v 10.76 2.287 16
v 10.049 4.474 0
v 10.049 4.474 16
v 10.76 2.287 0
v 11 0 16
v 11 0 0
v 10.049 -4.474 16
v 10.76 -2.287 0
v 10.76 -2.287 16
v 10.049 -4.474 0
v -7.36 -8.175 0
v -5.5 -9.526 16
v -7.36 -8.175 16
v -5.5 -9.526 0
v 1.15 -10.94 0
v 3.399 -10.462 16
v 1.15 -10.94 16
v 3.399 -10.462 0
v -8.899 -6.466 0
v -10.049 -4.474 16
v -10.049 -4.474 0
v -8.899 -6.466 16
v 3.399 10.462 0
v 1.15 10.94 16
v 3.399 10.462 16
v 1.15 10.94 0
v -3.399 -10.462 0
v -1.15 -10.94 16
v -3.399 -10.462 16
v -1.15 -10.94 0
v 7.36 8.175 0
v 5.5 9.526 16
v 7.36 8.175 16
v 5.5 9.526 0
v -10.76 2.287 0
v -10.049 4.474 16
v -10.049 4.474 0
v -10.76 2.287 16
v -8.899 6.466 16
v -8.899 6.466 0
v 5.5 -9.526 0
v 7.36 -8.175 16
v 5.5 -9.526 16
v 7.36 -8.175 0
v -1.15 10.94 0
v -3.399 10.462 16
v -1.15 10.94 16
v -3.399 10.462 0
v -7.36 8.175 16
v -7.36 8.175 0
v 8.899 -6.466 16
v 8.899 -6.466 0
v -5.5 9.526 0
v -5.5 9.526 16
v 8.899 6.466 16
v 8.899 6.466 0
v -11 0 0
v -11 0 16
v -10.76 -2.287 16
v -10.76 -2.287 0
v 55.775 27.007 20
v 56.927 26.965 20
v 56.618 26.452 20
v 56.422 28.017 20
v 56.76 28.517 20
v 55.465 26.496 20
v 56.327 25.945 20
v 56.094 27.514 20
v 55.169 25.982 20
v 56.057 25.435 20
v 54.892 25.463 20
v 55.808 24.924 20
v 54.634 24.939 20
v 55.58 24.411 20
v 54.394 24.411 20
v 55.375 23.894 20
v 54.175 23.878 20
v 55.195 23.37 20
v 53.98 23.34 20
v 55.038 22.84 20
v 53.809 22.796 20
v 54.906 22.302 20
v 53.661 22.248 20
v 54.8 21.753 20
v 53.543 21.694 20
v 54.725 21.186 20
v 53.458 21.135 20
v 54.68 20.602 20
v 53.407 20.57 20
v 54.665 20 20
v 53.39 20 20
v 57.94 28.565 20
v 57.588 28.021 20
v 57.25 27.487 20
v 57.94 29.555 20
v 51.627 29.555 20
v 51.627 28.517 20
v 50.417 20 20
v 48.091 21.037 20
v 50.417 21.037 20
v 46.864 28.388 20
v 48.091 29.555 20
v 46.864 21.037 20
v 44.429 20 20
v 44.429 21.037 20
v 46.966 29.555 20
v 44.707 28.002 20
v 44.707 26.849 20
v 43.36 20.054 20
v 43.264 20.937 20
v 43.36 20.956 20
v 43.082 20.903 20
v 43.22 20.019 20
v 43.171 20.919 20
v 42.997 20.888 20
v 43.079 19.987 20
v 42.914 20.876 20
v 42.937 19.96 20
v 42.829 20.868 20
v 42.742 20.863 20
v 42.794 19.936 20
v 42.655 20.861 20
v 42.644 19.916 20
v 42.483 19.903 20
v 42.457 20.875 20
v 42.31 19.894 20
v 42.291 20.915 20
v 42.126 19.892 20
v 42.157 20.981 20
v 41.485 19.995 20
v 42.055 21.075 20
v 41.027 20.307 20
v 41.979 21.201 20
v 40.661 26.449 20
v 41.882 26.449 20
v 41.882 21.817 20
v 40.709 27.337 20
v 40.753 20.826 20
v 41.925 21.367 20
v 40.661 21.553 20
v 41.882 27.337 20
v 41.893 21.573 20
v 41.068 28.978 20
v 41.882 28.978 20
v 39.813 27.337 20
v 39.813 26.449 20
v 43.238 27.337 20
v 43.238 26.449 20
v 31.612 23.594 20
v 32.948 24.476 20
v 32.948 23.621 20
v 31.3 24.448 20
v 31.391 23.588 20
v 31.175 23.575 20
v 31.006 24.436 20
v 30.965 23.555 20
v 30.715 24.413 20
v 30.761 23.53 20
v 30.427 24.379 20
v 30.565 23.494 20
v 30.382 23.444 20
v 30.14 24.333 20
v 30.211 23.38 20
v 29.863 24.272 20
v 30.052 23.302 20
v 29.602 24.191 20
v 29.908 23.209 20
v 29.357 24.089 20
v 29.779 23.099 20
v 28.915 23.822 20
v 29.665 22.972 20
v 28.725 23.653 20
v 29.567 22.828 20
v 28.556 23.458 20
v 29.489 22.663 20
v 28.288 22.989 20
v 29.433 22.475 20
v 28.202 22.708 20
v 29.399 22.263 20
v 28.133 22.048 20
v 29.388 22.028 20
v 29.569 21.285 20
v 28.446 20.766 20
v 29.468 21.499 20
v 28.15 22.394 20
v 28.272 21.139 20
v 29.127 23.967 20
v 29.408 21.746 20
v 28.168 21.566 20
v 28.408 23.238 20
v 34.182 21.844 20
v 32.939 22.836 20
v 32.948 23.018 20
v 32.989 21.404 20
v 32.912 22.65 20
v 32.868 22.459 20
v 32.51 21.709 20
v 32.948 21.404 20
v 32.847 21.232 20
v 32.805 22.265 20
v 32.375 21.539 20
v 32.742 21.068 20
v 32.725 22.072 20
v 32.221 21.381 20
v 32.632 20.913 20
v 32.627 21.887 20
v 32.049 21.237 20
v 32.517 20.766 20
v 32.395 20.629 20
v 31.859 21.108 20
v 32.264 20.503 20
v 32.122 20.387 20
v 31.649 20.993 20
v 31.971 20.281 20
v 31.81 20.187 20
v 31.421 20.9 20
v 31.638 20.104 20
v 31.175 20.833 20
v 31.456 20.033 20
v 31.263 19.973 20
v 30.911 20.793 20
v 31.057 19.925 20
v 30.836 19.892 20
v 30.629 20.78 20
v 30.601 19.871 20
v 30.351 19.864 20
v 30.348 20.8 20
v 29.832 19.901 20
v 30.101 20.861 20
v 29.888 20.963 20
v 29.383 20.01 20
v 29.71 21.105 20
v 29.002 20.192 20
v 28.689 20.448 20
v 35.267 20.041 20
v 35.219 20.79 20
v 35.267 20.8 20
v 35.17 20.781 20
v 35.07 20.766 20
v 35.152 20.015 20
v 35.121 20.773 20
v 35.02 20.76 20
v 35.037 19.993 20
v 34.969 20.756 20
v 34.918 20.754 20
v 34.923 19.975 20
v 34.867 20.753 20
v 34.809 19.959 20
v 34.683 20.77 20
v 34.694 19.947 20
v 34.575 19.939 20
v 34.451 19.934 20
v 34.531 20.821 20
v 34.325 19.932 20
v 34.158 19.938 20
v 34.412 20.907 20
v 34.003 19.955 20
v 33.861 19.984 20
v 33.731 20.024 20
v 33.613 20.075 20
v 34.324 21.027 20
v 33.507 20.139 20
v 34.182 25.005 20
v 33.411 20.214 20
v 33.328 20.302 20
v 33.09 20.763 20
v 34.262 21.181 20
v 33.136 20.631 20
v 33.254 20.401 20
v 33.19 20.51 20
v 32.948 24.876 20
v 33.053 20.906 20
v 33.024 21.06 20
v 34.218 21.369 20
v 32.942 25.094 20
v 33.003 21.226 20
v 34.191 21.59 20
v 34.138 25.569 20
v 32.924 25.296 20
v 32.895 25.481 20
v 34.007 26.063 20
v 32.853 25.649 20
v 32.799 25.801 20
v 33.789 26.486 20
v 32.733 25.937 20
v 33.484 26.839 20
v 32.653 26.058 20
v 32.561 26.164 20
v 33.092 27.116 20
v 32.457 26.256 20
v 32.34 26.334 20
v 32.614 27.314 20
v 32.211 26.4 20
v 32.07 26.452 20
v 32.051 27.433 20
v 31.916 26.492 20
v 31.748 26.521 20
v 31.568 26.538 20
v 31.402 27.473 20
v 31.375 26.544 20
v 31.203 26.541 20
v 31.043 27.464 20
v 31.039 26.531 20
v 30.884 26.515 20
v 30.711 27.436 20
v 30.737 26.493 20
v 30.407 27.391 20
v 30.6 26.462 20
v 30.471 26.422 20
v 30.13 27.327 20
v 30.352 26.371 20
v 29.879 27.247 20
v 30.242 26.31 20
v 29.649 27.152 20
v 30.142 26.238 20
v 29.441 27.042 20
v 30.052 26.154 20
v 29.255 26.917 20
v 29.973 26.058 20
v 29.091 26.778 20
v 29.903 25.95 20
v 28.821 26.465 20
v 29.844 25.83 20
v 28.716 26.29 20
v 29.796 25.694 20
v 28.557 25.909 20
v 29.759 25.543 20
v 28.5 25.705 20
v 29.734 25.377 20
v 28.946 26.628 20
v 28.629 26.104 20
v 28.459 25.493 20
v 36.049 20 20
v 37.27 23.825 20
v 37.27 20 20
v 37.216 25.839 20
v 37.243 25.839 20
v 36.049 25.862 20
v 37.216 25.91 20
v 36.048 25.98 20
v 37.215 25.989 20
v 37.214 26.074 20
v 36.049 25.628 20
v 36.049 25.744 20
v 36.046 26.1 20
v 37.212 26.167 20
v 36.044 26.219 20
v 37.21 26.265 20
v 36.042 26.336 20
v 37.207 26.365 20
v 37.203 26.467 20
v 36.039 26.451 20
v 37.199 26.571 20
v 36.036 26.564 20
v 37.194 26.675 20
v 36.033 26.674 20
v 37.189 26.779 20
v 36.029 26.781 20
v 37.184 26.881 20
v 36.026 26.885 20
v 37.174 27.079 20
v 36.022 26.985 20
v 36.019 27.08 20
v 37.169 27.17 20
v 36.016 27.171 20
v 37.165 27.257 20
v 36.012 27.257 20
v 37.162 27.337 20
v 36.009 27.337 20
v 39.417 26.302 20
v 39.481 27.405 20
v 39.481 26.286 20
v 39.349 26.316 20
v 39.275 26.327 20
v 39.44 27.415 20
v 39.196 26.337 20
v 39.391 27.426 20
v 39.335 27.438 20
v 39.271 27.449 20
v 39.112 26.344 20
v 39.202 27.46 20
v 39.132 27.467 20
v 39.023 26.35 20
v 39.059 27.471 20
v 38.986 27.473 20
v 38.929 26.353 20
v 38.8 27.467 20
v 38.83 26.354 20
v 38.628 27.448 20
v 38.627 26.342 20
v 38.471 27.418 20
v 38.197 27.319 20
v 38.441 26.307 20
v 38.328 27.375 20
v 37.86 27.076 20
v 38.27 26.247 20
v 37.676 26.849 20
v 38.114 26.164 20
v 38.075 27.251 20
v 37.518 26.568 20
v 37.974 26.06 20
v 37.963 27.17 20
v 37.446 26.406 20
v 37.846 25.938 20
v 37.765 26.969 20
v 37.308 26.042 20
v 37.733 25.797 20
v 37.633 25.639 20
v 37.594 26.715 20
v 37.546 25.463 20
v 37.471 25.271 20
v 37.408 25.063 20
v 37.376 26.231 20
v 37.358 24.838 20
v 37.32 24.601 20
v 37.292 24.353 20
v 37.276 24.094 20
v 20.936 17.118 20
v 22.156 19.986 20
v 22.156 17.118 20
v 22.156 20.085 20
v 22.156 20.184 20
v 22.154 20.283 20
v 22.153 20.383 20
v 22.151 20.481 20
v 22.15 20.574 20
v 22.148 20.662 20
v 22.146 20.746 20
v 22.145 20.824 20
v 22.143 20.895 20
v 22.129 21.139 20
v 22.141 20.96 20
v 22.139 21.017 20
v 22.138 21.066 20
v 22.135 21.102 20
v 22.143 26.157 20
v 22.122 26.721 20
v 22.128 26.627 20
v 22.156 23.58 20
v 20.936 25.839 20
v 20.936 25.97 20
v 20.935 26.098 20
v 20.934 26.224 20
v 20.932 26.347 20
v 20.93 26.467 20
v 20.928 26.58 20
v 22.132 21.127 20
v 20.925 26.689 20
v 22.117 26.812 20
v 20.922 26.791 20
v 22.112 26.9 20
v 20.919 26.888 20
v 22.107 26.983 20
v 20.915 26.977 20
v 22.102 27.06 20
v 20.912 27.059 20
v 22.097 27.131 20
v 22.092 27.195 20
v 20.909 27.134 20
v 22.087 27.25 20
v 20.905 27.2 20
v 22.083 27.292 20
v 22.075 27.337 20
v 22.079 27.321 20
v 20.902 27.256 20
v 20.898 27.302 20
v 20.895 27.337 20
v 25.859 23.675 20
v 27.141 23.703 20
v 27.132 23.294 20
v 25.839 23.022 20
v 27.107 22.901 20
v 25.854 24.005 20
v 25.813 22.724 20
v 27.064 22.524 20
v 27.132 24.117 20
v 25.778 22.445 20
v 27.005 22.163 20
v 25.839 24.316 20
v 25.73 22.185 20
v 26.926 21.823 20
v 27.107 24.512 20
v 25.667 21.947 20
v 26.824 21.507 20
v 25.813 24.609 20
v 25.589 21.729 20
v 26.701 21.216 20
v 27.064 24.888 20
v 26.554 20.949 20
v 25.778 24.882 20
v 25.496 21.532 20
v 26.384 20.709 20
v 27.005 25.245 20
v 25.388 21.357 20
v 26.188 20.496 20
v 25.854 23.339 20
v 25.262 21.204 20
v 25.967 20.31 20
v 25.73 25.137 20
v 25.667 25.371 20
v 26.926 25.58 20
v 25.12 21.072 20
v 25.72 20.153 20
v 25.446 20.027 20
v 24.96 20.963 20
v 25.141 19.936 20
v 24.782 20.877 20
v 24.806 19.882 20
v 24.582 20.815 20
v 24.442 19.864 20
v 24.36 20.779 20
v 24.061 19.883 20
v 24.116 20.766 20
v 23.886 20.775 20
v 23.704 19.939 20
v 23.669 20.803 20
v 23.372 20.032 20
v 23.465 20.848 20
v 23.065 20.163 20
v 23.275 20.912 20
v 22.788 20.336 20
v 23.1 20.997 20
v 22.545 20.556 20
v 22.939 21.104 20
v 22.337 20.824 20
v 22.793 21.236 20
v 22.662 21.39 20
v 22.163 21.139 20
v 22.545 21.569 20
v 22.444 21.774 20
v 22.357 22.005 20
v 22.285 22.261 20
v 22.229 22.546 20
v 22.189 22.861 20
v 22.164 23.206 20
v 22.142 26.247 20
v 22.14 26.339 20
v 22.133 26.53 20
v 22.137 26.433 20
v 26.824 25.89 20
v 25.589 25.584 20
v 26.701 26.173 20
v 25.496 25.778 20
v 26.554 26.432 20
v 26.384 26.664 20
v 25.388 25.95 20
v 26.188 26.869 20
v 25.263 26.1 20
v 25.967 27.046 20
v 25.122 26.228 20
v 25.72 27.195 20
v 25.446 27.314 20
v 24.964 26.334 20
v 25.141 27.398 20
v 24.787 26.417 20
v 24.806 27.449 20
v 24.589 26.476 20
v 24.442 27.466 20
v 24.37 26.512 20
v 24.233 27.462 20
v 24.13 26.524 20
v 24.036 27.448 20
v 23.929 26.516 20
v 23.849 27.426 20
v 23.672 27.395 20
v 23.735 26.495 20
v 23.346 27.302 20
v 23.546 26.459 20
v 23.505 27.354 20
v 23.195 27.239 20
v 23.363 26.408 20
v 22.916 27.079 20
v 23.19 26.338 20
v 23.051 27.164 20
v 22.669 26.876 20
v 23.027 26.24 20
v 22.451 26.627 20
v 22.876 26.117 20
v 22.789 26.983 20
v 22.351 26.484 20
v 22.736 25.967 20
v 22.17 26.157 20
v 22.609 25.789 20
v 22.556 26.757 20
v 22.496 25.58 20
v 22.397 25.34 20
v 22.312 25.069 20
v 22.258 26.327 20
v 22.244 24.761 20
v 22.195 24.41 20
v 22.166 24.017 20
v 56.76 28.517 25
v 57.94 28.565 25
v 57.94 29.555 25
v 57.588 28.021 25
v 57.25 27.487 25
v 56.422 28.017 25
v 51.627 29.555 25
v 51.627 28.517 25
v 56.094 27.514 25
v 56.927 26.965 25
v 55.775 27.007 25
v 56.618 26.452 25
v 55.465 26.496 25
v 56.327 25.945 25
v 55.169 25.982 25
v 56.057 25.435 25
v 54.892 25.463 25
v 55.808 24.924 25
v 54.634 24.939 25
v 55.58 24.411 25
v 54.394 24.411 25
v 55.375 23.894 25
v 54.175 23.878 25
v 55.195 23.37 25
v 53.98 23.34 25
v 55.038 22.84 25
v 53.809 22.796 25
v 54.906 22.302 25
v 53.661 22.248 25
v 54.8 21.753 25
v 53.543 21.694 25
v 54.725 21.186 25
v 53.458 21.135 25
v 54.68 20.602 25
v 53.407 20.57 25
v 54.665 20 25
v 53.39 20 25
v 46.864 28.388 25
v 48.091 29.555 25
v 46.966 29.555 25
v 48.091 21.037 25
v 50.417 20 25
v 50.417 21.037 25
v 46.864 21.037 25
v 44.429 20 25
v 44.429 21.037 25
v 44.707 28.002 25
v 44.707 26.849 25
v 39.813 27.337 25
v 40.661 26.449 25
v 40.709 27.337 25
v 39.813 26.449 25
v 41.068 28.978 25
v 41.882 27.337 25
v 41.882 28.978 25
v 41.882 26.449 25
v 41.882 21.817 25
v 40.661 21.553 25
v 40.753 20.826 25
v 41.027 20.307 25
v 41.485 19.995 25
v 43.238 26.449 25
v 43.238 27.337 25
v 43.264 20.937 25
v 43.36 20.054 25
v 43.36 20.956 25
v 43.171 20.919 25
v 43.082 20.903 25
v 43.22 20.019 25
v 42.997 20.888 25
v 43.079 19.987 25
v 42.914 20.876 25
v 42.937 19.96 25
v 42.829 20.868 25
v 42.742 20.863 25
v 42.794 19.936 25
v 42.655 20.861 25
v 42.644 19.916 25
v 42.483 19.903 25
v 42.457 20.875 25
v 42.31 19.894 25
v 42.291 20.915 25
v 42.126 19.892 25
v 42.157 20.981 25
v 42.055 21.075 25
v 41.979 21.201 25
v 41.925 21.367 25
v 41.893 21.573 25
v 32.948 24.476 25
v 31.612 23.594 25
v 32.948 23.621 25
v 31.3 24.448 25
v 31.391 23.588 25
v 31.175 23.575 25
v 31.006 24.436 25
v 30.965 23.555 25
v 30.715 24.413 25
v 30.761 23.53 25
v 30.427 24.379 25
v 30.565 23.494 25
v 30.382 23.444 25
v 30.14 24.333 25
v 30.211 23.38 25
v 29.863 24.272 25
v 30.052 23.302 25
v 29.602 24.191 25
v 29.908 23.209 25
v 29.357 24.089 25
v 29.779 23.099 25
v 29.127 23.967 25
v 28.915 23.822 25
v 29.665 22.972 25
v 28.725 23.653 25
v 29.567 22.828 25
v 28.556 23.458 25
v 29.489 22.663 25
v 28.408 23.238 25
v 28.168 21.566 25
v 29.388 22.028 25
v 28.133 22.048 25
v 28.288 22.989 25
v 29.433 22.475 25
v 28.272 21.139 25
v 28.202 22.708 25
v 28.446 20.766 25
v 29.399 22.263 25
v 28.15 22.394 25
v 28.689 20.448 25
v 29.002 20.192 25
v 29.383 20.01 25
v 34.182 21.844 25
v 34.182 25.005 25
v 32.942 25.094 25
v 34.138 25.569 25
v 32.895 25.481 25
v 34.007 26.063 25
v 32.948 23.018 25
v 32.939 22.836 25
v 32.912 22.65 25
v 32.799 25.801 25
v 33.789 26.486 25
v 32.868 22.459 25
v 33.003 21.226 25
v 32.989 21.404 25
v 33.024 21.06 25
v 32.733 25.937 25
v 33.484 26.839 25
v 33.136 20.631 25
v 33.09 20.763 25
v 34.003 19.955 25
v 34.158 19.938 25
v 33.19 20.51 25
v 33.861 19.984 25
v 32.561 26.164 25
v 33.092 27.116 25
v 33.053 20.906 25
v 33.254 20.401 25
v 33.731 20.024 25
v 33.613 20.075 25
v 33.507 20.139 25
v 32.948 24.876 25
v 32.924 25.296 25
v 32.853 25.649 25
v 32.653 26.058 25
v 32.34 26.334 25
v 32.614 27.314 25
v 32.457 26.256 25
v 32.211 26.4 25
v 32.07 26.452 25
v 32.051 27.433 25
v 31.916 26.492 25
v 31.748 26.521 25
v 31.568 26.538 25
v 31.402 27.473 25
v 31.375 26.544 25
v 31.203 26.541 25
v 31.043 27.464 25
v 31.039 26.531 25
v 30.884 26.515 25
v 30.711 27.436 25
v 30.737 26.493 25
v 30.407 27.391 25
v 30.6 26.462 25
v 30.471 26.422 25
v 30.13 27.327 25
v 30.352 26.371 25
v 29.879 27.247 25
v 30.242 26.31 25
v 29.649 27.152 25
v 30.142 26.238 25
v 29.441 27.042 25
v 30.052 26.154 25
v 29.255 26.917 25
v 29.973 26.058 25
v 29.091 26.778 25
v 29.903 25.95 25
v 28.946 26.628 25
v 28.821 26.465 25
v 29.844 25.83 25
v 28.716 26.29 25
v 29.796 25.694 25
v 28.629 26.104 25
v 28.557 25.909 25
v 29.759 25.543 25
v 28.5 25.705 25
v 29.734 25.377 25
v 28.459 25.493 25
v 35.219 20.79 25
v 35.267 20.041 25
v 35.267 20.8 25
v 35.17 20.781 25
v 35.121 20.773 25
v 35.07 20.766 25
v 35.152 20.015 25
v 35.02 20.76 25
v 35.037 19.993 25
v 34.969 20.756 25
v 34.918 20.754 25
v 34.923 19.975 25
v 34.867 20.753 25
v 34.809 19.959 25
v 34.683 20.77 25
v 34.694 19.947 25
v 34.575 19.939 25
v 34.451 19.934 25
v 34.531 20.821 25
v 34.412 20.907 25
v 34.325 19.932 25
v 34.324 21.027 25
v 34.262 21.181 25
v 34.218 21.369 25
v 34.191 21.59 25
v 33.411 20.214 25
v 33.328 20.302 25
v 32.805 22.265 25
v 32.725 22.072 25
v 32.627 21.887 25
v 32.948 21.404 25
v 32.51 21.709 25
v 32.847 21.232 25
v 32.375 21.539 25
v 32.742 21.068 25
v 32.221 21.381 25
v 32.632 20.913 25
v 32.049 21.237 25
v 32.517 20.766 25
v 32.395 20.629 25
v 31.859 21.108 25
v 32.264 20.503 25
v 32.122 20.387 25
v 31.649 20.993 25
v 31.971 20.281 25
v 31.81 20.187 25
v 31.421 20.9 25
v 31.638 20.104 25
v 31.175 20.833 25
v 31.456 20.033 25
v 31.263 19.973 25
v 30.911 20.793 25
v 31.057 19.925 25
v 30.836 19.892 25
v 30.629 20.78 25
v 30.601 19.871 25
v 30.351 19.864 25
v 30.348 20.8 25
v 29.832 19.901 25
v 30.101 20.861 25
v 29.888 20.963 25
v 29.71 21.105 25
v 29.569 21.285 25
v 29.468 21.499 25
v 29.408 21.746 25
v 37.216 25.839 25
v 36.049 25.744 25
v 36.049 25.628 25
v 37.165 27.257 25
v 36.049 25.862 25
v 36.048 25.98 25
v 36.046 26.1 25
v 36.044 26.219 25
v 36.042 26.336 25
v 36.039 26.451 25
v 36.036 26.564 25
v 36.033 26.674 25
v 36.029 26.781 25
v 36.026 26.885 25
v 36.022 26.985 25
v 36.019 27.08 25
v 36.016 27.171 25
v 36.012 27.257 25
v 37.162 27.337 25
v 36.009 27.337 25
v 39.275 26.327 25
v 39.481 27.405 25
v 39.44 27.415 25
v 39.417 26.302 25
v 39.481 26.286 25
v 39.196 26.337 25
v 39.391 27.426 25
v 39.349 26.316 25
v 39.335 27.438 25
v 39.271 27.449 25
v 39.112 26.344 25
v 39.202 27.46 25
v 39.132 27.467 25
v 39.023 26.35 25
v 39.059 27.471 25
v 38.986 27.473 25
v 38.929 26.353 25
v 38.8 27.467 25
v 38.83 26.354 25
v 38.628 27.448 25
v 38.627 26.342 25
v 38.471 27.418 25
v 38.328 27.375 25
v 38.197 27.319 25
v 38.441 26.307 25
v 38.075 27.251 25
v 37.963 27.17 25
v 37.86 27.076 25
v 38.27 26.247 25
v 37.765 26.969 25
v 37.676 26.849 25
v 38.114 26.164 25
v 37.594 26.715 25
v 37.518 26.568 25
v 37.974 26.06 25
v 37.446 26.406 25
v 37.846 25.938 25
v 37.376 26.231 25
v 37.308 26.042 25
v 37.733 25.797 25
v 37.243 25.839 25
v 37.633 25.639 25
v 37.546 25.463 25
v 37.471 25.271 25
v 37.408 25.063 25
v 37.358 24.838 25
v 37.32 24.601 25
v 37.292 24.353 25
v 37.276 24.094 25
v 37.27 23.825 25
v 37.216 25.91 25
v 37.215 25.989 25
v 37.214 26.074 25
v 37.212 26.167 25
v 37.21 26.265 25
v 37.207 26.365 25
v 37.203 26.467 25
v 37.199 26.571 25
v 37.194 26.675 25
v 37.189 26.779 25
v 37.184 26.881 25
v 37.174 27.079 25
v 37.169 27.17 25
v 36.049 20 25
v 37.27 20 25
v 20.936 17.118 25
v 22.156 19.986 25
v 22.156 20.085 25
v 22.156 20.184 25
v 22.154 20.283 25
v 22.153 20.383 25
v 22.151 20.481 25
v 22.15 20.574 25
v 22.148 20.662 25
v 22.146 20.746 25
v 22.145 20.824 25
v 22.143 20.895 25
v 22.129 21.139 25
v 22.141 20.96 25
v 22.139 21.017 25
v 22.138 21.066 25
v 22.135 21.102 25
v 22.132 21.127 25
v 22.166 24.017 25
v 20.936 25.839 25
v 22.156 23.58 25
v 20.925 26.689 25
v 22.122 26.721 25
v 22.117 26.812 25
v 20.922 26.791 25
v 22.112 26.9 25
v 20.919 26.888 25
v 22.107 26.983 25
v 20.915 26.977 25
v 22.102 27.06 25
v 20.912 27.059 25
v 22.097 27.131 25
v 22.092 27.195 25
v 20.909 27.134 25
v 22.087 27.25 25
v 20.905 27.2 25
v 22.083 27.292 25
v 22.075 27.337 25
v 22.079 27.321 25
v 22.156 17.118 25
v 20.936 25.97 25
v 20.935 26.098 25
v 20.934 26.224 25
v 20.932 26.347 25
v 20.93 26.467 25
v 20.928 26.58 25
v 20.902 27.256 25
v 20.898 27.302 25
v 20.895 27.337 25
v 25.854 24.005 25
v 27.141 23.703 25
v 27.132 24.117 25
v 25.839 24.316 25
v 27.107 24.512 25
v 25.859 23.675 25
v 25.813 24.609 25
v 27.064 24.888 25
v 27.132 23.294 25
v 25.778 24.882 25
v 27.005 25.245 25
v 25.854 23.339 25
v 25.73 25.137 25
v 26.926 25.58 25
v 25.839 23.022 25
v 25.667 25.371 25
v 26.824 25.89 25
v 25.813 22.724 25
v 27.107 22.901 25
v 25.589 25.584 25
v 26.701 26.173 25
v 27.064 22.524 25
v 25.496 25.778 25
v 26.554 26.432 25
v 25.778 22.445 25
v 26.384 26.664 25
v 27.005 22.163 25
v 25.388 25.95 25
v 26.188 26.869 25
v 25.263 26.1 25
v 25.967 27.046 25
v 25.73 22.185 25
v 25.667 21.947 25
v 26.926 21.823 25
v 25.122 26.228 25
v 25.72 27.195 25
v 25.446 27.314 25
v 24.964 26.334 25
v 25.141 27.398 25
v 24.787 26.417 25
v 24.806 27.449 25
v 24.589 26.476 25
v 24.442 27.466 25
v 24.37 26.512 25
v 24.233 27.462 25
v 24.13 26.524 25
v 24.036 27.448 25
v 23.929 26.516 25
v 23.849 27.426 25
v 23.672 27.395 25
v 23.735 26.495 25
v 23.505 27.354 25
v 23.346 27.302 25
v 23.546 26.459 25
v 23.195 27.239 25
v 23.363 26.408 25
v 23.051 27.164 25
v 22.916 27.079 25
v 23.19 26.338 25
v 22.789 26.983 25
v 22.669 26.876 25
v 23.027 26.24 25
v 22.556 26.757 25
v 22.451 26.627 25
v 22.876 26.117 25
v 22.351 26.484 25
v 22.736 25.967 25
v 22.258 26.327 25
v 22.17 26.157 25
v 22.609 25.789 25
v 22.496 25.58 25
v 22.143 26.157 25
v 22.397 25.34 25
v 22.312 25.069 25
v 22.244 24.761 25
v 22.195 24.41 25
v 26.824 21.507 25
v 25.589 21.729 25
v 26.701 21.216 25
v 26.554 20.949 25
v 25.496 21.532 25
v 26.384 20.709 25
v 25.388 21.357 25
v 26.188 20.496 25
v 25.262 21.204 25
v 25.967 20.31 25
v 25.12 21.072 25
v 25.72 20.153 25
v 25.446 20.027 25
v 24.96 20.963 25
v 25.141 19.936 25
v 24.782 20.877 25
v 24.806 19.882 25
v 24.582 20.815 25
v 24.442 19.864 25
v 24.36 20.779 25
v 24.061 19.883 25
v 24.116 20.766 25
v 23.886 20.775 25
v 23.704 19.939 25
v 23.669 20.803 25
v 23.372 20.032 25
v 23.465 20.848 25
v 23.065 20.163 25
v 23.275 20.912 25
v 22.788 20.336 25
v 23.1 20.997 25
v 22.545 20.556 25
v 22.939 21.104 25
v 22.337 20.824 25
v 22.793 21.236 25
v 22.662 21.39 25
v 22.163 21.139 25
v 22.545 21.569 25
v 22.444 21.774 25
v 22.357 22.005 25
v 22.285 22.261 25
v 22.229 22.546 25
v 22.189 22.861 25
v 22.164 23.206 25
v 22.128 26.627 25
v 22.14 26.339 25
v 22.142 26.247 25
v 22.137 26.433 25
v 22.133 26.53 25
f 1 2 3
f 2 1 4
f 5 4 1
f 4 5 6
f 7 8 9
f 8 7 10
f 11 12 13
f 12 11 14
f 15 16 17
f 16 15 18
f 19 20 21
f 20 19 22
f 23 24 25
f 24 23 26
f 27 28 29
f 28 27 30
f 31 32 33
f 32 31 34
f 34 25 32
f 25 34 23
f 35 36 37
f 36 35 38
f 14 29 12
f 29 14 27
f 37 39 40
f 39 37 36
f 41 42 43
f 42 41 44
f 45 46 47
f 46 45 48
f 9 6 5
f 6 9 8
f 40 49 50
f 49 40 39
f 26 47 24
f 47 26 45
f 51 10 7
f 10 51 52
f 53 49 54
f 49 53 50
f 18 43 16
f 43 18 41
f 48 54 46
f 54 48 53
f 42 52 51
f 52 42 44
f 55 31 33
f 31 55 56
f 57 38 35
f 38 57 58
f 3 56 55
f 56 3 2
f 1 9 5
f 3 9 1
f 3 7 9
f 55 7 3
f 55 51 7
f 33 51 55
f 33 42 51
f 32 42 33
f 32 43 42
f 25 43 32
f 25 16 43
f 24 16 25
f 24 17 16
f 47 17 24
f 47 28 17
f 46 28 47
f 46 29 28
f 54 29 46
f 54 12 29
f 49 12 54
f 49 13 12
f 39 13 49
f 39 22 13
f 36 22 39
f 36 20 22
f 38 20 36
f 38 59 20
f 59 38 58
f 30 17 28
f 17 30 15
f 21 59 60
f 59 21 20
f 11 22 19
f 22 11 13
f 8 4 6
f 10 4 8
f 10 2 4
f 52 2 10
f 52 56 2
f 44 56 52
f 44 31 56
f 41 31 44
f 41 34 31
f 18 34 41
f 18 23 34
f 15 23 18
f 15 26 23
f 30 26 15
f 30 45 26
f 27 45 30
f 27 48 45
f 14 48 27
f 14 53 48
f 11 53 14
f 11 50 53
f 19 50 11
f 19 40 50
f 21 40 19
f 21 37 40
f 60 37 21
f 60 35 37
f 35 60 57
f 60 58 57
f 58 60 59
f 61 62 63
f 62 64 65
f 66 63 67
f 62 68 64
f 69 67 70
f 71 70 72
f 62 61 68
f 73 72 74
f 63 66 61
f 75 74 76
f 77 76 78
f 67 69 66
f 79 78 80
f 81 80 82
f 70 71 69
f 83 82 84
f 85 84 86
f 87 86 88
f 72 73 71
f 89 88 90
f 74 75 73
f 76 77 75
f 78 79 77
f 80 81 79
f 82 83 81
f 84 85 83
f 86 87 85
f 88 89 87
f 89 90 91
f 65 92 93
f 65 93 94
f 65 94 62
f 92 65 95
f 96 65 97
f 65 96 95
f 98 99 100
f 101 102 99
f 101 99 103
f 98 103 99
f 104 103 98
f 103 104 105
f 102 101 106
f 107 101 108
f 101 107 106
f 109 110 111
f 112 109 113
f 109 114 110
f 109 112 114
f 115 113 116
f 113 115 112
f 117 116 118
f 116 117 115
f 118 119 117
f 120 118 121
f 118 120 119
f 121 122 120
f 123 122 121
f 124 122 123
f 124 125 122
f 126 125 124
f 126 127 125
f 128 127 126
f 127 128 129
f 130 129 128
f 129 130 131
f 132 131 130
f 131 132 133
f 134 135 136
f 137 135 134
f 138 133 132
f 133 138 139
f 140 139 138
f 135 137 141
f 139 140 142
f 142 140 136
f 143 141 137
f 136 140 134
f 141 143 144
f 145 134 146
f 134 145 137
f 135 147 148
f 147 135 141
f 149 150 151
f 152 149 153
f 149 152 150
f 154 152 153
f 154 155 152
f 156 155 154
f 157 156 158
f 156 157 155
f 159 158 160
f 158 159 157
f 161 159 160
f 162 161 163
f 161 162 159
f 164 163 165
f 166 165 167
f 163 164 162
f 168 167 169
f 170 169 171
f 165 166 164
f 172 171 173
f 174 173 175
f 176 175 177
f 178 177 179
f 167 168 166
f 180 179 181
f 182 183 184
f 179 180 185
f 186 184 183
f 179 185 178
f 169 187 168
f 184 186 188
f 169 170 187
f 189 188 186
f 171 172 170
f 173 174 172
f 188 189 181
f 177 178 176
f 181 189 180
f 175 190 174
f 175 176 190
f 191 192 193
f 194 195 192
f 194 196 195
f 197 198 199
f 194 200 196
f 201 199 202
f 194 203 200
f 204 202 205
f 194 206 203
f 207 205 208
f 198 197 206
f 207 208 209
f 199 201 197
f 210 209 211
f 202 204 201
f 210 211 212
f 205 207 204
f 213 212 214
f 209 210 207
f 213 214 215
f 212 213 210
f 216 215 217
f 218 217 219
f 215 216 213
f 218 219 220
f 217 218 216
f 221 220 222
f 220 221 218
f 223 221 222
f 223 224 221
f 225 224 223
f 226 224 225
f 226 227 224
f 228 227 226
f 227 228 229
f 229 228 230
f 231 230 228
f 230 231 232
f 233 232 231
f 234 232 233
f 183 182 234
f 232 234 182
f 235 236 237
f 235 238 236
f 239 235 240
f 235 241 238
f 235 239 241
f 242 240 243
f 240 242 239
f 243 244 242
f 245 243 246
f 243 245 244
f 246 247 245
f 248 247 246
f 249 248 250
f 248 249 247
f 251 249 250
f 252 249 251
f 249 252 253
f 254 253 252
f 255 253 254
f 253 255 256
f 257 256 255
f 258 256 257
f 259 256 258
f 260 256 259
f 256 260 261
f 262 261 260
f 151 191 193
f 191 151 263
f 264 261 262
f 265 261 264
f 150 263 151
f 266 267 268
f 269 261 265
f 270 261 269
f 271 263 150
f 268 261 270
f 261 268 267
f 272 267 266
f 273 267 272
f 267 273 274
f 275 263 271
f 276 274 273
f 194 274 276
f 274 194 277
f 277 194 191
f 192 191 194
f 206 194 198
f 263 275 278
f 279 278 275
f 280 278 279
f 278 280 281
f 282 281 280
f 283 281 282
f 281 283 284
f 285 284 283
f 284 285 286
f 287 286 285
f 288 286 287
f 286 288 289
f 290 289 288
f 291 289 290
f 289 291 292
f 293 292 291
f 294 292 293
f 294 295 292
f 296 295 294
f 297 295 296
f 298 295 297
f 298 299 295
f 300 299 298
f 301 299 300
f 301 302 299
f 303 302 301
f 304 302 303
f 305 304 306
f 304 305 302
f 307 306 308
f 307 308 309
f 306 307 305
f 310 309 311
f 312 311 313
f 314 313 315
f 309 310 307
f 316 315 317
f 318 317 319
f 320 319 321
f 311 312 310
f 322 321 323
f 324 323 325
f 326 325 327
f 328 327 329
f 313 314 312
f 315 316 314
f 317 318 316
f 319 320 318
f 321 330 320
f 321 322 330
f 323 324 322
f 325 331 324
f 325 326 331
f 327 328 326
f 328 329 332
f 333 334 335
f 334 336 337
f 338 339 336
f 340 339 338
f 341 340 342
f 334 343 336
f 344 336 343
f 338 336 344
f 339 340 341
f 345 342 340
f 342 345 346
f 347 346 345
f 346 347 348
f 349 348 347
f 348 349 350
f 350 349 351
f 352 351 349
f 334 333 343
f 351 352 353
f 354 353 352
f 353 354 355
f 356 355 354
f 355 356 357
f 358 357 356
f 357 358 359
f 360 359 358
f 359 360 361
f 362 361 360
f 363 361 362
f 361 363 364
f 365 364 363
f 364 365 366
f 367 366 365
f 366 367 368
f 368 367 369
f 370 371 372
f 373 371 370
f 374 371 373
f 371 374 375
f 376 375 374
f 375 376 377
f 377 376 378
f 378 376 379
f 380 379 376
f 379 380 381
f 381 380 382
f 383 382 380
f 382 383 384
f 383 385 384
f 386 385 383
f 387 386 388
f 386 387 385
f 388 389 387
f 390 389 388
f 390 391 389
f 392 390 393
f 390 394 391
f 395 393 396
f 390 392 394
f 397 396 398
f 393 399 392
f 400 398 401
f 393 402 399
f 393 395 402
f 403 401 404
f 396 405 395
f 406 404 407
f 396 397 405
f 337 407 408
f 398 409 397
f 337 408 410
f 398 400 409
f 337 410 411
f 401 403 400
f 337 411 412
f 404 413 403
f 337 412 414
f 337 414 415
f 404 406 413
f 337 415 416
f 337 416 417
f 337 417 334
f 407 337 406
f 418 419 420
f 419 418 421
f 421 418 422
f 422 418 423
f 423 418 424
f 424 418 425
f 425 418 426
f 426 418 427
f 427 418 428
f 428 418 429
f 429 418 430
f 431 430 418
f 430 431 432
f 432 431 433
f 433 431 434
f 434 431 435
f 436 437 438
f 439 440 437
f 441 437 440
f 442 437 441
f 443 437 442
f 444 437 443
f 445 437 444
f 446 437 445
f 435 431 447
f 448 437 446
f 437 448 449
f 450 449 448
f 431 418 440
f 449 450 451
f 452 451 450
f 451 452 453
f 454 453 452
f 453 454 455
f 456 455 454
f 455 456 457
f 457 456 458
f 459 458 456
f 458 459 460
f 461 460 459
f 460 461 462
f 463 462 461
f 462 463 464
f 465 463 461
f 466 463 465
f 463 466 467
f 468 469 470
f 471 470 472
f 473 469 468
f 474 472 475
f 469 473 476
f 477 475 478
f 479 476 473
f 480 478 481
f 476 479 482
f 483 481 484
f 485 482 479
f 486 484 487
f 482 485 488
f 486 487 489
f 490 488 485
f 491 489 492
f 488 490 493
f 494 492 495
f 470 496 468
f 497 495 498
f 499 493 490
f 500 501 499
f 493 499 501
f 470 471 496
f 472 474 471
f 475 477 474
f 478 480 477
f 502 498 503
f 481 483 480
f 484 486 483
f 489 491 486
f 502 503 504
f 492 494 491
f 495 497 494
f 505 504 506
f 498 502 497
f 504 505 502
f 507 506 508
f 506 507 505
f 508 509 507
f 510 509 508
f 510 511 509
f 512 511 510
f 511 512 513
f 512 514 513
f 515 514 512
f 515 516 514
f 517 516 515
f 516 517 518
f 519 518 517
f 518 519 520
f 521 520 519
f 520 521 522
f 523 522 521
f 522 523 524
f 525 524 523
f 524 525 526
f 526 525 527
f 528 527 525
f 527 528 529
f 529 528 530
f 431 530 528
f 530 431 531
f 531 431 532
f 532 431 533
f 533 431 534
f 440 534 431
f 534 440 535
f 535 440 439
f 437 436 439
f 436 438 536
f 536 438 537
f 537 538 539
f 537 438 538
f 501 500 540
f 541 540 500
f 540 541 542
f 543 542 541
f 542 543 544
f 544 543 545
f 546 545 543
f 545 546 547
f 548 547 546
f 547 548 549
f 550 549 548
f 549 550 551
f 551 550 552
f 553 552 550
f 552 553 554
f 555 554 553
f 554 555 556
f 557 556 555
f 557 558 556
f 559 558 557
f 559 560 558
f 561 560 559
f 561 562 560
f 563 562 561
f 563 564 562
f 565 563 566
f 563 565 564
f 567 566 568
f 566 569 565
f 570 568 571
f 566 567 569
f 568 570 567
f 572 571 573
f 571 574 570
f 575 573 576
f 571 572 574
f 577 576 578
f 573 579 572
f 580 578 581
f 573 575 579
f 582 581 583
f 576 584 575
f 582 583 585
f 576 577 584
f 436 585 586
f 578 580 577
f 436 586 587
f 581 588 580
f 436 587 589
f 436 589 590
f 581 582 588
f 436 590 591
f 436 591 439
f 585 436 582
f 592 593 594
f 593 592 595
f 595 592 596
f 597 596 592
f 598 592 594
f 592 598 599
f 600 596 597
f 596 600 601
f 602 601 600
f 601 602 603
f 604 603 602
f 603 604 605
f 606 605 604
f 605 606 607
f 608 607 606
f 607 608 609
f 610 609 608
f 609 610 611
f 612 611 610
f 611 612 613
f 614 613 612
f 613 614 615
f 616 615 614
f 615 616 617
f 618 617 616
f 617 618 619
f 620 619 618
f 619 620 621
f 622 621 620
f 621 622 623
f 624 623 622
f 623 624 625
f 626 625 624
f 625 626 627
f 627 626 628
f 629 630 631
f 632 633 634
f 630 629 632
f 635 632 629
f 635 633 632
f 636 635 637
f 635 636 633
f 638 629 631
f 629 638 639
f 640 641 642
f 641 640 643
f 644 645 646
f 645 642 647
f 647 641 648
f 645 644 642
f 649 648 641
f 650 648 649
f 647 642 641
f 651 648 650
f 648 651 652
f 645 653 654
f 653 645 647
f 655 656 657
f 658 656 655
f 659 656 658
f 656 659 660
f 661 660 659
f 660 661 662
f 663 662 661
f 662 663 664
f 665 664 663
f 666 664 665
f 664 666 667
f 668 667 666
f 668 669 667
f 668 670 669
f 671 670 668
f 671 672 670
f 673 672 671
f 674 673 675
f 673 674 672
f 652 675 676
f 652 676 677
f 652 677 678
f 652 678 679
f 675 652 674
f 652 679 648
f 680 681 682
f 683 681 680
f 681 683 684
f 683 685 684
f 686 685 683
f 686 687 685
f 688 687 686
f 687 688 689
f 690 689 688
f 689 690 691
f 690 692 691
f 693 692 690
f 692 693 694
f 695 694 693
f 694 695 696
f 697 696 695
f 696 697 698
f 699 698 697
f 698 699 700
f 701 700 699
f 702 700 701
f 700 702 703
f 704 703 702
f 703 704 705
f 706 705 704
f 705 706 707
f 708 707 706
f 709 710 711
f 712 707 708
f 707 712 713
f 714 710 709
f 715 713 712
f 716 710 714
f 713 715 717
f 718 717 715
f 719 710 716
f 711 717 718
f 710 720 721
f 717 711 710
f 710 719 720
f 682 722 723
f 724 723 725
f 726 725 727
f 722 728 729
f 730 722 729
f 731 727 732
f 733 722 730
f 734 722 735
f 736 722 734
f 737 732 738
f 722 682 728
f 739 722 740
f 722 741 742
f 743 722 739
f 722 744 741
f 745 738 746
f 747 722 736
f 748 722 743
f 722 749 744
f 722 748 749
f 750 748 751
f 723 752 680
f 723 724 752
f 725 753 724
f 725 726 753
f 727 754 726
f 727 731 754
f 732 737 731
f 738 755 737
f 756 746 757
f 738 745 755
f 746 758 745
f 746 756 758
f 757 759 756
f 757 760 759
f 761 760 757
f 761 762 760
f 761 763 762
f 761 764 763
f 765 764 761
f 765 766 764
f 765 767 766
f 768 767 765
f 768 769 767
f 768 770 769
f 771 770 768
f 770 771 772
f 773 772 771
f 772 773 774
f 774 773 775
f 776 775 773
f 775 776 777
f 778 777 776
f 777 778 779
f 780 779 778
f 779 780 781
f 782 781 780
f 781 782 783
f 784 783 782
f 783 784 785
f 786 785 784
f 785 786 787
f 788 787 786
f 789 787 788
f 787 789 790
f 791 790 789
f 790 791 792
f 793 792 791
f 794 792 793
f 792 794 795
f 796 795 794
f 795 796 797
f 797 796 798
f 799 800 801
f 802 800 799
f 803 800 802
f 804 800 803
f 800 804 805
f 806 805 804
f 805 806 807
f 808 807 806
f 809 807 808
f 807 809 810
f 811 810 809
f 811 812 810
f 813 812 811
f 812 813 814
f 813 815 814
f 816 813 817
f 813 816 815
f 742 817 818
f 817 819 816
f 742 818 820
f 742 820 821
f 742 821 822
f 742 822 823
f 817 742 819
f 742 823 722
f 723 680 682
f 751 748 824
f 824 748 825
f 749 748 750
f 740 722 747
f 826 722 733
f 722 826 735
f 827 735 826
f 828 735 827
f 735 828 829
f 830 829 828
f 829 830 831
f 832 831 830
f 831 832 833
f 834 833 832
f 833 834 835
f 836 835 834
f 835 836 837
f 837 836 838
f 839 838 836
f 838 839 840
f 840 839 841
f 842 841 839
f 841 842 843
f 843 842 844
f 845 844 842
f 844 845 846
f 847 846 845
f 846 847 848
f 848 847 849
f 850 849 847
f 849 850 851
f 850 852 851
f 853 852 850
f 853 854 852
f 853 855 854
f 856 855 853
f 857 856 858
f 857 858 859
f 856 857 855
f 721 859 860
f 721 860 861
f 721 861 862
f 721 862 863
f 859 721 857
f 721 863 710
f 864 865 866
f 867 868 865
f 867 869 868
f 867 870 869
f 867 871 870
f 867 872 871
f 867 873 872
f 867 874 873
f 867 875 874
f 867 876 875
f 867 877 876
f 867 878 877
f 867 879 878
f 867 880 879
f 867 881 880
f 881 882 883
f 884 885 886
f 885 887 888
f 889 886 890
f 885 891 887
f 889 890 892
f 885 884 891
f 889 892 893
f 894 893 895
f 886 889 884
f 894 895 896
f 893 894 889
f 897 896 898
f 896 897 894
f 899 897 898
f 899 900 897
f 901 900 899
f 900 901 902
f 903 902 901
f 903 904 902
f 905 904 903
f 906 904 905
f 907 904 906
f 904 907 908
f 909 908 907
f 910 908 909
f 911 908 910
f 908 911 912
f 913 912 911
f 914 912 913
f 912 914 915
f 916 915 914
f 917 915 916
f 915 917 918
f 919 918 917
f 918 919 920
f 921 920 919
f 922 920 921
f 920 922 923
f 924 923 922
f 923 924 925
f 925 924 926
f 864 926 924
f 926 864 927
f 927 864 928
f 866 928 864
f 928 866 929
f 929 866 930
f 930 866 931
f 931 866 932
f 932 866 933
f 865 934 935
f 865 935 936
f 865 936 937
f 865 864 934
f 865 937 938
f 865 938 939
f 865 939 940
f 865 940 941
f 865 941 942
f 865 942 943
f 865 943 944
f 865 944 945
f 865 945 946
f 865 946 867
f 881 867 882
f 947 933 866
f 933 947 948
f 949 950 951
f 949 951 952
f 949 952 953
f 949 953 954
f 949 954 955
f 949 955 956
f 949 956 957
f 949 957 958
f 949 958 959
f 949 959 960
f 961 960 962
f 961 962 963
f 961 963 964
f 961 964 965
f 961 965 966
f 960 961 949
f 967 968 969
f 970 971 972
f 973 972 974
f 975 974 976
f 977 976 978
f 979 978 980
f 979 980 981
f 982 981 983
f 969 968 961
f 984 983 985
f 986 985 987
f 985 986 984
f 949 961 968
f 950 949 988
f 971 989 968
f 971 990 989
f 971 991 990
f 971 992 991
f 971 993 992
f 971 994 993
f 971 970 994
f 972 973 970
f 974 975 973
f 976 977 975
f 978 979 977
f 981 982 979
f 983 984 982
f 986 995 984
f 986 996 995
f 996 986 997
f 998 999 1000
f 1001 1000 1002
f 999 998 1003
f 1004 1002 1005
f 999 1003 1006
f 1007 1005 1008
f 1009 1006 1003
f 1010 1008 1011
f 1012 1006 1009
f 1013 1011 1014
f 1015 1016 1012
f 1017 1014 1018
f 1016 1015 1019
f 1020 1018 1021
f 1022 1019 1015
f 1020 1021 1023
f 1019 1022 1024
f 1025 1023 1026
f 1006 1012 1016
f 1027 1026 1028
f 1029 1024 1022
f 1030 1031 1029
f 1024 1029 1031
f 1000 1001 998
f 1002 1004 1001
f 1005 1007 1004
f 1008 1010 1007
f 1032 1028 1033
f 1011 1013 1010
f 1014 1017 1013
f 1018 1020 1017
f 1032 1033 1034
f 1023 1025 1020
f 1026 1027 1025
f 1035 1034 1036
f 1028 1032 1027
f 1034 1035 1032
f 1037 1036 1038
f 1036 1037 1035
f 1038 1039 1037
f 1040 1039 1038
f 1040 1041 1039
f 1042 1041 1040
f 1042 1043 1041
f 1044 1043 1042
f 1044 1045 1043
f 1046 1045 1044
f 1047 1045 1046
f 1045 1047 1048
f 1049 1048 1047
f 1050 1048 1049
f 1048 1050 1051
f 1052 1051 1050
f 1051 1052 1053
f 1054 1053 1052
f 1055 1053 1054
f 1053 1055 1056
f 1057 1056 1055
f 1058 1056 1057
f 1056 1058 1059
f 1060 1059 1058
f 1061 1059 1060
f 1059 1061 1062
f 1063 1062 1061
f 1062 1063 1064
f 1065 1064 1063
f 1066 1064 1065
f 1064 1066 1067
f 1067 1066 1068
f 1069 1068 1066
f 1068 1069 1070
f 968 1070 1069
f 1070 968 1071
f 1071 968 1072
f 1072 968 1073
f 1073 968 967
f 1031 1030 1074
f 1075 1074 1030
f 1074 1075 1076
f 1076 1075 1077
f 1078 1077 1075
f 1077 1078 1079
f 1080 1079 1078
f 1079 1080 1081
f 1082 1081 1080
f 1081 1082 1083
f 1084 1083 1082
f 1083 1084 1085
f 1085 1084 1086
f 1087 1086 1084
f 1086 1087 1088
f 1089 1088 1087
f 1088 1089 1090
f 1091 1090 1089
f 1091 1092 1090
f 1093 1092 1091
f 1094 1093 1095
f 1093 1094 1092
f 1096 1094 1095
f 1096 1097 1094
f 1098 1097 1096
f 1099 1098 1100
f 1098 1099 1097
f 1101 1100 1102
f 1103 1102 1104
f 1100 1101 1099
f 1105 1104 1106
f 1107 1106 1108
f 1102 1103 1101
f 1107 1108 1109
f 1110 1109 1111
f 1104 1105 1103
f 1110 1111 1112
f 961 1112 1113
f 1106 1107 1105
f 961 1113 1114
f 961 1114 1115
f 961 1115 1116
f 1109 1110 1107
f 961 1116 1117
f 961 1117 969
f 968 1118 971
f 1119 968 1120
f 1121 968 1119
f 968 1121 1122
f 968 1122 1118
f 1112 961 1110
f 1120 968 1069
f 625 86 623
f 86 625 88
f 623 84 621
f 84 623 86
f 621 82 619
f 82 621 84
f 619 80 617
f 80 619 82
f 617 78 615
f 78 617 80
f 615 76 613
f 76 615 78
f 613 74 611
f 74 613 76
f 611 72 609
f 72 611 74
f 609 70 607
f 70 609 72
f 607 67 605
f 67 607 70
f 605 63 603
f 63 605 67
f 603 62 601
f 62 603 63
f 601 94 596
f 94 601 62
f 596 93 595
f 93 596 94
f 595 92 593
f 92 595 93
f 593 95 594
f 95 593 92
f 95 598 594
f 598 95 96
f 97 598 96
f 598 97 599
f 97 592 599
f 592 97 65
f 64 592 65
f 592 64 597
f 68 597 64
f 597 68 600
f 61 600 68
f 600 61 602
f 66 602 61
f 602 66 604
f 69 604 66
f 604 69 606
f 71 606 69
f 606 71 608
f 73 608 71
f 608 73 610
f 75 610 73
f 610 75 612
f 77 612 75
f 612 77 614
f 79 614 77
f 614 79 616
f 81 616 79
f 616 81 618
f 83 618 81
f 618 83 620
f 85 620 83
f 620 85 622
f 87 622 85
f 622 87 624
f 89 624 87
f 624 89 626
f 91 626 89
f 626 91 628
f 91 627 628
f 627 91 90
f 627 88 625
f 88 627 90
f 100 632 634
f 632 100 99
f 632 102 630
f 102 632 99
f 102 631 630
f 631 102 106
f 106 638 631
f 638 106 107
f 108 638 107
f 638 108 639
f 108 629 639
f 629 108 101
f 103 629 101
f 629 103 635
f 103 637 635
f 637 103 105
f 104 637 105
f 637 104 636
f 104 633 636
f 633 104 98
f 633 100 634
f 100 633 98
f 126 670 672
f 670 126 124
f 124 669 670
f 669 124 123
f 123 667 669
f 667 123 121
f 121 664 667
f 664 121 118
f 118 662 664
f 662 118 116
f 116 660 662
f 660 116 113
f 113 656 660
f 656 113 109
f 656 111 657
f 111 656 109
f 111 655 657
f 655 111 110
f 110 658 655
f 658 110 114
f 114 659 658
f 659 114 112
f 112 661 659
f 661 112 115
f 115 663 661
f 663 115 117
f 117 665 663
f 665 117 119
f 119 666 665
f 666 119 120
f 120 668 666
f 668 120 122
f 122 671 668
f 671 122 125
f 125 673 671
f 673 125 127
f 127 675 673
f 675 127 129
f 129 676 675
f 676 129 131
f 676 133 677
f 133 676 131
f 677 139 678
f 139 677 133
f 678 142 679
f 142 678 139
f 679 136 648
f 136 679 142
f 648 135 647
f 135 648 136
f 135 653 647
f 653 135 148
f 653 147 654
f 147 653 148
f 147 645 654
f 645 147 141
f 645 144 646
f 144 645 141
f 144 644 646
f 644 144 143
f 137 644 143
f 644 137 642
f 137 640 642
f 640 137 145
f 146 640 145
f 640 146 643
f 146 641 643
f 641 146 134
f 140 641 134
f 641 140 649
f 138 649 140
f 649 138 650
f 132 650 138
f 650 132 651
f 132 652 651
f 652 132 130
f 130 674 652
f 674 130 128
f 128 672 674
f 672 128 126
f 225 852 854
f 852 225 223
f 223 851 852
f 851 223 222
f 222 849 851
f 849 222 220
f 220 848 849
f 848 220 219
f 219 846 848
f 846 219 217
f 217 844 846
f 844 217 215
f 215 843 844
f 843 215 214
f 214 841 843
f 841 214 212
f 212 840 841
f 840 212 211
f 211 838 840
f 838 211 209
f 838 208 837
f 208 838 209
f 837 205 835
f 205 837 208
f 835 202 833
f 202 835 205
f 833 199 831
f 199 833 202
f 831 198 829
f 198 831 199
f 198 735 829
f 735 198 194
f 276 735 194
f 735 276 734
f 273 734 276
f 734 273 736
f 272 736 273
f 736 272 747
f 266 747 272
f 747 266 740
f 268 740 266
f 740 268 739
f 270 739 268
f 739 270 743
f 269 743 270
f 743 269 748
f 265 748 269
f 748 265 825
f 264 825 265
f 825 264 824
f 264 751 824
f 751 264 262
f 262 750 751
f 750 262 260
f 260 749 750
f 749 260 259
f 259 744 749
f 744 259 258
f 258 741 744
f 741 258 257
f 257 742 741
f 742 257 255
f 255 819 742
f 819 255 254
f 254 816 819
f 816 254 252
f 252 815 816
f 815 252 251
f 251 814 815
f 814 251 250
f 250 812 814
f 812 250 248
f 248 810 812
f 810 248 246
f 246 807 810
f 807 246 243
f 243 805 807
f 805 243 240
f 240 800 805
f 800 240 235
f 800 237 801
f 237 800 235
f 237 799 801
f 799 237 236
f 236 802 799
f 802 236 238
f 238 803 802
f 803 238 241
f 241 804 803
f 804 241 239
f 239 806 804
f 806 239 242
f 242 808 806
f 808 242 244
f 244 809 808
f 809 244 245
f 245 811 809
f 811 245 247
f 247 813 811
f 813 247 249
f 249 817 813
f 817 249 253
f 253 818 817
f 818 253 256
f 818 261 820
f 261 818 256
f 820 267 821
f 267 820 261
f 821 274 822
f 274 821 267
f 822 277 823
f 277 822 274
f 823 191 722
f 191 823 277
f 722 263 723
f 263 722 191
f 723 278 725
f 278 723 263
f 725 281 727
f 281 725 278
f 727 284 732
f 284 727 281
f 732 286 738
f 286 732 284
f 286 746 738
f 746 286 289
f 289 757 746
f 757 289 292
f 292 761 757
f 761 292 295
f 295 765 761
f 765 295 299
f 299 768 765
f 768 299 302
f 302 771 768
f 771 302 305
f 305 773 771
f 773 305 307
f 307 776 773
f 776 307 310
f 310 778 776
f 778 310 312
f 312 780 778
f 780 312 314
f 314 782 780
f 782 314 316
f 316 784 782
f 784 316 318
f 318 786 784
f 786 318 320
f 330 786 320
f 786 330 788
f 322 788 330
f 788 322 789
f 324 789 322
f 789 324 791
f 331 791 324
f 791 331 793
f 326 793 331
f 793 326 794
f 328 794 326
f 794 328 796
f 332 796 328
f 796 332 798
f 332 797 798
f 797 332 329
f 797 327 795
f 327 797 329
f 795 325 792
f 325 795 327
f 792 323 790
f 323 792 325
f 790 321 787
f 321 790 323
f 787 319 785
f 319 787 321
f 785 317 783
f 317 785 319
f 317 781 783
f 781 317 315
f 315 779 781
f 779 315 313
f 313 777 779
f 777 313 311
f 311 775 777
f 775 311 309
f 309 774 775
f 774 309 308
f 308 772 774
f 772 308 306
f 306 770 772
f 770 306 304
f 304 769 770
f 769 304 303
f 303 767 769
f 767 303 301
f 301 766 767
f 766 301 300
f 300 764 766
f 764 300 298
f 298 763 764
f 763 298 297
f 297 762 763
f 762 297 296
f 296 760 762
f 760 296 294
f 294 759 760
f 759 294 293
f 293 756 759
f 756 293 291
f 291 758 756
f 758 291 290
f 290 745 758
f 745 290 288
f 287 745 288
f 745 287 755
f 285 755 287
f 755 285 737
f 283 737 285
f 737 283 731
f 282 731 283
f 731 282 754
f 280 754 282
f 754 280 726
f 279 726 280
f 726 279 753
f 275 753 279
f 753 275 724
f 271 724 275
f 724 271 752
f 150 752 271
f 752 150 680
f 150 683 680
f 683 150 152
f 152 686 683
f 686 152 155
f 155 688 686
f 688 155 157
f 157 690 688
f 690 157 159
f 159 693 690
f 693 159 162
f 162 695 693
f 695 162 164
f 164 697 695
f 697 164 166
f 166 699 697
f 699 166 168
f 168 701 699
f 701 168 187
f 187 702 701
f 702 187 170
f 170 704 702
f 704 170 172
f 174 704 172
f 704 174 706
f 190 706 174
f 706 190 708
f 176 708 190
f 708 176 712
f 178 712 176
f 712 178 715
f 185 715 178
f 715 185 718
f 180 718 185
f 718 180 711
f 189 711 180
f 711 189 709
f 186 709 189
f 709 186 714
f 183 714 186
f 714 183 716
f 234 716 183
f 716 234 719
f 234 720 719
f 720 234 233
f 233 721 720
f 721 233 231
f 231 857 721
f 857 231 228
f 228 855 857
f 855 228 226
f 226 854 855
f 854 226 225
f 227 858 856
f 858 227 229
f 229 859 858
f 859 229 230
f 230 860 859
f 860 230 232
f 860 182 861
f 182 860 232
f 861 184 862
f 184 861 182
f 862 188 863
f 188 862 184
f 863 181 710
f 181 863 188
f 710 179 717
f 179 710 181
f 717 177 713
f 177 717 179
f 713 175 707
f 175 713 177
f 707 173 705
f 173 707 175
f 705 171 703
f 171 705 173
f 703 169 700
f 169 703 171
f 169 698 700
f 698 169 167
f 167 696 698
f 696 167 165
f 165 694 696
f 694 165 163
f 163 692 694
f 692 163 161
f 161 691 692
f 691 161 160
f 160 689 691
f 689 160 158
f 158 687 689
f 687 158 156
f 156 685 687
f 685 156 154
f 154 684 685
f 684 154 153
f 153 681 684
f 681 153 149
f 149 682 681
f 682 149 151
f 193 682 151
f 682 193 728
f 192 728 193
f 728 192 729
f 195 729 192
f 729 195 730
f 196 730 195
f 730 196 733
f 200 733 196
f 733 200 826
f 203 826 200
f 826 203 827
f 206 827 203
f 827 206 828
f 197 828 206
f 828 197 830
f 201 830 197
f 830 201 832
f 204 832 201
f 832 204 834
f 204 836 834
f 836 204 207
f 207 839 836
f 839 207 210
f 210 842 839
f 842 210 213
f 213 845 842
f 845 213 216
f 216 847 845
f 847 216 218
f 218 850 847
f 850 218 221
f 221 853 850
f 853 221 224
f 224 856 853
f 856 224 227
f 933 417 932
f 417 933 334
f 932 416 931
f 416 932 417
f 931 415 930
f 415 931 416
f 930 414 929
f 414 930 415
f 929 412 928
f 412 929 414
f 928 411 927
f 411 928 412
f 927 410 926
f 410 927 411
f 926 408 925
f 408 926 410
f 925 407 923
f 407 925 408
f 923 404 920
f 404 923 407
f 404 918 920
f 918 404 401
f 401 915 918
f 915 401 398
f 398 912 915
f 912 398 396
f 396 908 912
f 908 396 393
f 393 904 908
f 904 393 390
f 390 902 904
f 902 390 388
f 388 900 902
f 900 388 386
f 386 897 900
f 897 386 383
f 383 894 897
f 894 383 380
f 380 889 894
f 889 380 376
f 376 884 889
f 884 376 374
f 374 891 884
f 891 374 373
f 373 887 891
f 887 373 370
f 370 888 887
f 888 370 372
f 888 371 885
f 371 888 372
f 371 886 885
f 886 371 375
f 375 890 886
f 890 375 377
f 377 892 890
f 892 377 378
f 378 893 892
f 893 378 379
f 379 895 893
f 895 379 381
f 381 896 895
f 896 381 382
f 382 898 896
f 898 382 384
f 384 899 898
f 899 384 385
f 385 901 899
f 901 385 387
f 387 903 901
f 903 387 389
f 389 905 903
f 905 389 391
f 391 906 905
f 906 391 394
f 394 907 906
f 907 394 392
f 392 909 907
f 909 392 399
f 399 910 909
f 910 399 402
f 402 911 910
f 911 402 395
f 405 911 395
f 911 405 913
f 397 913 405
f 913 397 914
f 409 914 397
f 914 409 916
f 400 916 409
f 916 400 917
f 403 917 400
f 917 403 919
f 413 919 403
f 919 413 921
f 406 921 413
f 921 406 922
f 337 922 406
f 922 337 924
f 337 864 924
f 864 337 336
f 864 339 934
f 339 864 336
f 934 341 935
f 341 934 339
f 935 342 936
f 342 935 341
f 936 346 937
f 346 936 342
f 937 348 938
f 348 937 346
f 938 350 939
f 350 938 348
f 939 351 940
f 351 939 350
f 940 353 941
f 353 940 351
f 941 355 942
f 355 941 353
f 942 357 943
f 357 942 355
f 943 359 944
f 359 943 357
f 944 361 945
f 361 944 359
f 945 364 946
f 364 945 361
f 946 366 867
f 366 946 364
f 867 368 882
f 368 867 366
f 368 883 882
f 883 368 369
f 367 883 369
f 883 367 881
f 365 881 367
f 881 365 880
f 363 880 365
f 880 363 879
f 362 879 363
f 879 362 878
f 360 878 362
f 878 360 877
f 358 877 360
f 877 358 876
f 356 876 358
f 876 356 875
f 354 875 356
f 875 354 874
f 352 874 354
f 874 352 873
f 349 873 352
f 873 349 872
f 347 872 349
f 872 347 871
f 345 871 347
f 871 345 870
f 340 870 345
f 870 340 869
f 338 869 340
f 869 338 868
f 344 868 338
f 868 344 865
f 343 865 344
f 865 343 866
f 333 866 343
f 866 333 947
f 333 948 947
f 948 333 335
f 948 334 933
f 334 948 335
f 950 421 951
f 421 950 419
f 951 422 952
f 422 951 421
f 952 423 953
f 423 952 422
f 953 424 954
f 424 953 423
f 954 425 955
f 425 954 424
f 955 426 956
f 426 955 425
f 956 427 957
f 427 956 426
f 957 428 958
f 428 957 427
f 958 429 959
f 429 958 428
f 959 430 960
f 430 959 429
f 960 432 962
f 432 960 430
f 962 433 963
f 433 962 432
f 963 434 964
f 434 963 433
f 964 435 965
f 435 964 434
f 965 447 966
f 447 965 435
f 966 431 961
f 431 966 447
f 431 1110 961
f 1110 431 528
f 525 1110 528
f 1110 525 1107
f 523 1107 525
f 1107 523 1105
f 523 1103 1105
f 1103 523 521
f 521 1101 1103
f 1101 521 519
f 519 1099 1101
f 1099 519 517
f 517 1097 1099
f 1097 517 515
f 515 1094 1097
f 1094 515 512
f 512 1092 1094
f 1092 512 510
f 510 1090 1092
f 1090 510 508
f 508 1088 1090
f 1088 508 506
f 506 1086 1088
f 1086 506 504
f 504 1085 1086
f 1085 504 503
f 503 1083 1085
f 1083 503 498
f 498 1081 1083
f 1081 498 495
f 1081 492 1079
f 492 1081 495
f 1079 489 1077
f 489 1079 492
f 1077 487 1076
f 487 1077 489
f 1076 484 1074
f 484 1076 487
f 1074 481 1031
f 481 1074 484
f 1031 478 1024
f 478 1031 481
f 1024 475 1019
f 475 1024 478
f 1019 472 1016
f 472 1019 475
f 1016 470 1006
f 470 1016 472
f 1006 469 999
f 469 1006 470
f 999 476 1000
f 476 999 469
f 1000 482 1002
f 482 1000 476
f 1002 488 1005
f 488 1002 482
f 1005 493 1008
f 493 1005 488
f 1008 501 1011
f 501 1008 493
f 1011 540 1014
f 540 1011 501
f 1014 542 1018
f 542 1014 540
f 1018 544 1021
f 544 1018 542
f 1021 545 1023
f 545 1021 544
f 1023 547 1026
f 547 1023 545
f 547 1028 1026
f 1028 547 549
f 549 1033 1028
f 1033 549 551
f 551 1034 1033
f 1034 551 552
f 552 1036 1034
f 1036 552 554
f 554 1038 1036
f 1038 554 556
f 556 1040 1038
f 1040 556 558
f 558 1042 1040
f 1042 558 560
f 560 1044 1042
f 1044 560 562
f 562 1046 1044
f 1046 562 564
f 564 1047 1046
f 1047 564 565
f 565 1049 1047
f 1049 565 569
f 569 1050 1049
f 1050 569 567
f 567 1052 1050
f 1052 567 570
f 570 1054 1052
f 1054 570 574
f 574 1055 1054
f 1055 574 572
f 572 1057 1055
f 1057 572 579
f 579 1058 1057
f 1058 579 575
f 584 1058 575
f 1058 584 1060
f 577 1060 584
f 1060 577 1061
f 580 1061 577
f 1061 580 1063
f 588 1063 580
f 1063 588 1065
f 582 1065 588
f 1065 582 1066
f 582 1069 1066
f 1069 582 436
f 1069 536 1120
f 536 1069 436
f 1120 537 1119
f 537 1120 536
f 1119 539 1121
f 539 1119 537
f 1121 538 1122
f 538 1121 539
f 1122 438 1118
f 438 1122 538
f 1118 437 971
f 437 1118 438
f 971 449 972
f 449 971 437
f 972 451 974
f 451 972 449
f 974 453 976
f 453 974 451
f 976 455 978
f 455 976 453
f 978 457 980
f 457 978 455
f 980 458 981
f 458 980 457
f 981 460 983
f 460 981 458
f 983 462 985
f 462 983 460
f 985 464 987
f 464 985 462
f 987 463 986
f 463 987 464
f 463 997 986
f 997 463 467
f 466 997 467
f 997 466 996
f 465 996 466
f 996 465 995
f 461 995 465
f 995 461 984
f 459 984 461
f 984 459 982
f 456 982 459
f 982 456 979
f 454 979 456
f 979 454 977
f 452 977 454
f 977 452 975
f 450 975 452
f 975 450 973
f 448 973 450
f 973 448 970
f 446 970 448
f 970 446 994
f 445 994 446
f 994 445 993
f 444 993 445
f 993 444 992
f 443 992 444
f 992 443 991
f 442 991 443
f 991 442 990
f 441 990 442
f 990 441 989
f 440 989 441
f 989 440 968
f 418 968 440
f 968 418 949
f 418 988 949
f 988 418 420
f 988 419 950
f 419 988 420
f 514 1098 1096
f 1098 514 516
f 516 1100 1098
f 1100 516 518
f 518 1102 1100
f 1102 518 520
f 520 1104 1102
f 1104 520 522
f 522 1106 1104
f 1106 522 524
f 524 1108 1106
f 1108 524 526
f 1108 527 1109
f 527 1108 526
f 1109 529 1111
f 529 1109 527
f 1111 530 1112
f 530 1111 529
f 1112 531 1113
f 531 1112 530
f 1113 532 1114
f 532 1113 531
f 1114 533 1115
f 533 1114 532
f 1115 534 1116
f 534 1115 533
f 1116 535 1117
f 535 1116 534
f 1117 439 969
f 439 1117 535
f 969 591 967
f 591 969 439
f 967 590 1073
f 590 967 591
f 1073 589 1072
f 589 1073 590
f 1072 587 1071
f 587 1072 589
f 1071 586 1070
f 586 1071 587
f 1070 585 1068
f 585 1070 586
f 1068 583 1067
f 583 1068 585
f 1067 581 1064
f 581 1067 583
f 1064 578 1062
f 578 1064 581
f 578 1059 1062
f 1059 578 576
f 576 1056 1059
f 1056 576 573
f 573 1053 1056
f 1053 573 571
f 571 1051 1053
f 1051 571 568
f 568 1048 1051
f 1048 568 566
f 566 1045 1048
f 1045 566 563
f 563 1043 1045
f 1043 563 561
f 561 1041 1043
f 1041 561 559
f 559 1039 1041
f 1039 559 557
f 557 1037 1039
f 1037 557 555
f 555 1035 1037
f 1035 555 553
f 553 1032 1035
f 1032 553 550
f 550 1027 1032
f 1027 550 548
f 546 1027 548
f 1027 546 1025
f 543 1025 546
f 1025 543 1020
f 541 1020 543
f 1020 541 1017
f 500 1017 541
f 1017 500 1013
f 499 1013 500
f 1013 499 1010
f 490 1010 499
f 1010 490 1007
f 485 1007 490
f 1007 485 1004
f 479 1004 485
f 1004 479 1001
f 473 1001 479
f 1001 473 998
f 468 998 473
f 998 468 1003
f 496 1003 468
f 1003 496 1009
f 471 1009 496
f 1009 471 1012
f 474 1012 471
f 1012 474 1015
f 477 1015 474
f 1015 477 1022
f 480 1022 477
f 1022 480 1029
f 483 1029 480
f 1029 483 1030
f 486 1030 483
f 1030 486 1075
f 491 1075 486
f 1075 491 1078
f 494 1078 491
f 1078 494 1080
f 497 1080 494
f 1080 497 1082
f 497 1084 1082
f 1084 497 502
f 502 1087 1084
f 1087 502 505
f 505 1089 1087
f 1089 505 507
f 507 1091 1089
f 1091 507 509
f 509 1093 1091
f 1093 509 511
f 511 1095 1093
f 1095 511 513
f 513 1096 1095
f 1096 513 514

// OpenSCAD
//[CUSTOMIZATION]
// Height
h=16;
// Radius
r1=11;
// Message
txt="part17";
module __END_CUSTOMIZATIONS () { }
cylinder(h,r1,r1);
translate([20,20,20]) { linear_extrude(5) text(txt, font="Liberation Sans"); }
